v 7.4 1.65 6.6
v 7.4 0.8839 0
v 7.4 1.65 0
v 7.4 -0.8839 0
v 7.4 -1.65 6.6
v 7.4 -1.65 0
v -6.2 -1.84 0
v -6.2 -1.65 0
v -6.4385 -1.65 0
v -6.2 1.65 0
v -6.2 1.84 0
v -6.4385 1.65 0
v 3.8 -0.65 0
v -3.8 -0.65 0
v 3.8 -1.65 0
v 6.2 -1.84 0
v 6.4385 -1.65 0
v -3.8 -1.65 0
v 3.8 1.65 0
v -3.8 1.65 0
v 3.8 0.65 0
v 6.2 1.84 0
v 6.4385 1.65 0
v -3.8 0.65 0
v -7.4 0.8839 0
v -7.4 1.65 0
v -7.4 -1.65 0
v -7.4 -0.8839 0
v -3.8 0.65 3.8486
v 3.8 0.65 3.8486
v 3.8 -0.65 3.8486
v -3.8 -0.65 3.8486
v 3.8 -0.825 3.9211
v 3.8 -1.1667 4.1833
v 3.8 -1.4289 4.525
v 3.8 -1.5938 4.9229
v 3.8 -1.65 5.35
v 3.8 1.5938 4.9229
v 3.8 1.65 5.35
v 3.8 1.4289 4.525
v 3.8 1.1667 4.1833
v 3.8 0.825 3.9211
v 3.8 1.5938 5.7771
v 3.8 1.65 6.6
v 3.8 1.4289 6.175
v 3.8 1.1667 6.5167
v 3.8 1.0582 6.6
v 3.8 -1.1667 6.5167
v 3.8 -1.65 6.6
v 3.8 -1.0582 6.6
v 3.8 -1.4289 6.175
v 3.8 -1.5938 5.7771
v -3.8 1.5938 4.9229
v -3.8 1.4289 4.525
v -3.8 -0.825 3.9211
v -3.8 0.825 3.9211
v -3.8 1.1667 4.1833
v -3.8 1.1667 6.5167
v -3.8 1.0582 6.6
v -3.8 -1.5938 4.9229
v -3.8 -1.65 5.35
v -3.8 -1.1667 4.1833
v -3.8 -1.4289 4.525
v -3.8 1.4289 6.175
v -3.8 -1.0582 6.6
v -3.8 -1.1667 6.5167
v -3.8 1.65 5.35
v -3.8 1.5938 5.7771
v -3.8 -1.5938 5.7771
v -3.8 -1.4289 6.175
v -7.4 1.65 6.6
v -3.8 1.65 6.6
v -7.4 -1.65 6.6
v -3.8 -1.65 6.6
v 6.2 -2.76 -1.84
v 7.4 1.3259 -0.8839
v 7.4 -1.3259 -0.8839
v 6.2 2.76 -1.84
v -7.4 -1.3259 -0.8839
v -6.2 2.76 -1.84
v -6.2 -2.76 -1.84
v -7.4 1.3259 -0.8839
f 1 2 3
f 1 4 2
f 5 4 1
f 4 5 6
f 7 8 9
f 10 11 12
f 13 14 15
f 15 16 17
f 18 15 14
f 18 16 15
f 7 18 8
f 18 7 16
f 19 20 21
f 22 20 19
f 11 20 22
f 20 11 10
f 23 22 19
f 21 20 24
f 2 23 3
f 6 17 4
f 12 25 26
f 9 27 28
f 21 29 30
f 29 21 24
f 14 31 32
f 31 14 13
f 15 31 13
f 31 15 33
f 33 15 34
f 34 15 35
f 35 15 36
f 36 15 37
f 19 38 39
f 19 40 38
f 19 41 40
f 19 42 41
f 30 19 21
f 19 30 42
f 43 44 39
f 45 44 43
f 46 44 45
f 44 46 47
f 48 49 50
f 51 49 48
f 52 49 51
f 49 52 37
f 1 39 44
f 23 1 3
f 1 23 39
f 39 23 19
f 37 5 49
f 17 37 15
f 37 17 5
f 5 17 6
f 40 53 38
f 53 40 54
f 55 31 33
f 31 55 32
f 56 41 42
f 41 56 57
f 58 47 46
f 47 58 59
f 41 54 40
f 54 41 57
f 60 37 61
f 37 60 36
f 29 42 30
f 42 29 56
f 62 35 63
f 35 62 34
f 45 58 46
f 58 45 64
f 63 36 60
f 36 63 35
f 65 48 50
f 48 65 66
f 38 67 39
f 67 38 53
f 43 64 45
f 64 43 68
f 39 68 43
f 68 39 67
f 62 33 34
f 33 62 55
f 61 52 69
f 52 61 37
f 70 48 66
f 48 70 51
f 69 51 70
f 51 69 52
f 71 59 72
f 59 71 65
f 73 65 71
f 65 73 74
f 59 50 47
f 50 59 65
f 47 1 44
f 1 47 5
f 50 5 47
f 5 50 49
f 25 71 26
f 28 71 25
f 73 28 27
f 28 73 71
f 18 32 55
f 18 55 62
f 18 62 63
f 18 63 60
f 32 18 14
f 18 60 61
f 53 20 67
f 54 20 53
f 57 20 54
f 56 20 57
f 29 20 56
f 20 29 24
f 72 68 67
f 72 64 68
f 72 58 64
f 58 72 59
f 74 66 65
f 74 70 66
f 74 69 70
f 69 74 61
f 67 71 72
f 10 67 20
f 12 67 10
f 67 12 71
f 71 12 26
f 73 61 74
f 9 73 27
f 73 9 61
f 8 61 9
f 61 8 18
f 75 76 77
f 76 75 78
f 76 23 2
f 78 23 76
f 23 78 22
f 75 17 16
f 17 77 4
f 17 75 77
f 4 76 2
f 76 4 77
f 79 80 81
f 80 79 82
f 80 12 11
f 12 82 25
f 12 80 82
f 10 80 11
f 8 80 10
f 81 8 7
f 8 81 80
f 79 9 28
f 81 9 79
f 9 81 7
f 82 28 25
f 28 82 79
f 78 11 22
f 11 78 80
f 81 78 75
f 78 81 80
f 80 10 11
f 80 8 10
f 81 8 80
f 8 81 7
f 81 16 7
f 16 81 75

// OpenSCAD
// file: am_dovetail.scad
// am_dovetail.scad
// a library providing dovetail interconnections
//
//
// Background:
//   - CAD manual: http://www.openscad.org/documentation.html
//   - possibility to attach to parts from raspi_RJ45fix.scad
//
// Andreas Merz 2020-01-04, v0.2 
// GPLv3 or later, see http://www.gnu.org/licenses





//-------------------------------
// dovetail
//
//       w2
//    ---------
//    \       /  h
//     ---+---
//       w1
//-------------------------------

// Main dimensions
dt_w1=4;              // nominal size
dt_w2=6;
dt_h=2; 
dt_grid=dt_w1+dt_w2;  // 10 mm
dt_c=0.16;            // clearance / spiel in mm

dt_angle_deg=atan((dt_w2-dt_w1)/dt_w1);

// -------------------------------------------------------
// 2D shapes
// -------------------------------------------------------

module dt_shapeNominal(h=dt_h, w1=dt_w1, w2=dt_w2, c=0) {
             hh=h-c;
	     y1=w1/2-c;
	     y2=y1+(w2-w1)/2*hh/h;   // keep slope angle, even if c is not 0;
             polygon(points=[[-y1,0],[y1,0],[y2,hh],[-y2,hh]]);
}

module dt_shapeMajor() {
  dt_shapeNominal(c=-dt_c);
}

module dt_shapeMinor() {
  dt_shapeNominal(c=dt_c);
}


// -------------------------------------------------------
// 3D shapes
// -------------------------------------------------------

// legacy module

module dovetail3D(h=20, s=45, t=0.8) {
         c=0.3;   // clearance / spiel in mm
         difference() { 
           linear_extrude(height=h)
              union() {
                dt_shapeMinor();
                translate([-dt_h+c,-t]) square([dt_w1-2*c,t]);

              }
           rotate([s,0,0]) translate([-4,0,-4]) cube([8, 4, 4]);
         }
 }


// And cap - may be used to handle broadening at the printer bed

module am_dovetailCap(t=1.0, c=dt_c) {
      scl = (c < 0) ? 2 : 0;               // for negative clearances we create the dovetailSub case
      translate([0,0,0]) mirror([0,0,1])
      difference() {
	linear_extrude(height=dt_h/cos(30), scale=scl)
	  dt_shapeNominal(c=c);
	translate([-3*dt_w1,-3*dt_w2,t]) 
	  cube([6*dt_w1,6*dt_w2, dt_h/cos(30)+1]);
      }
}



// Dovetail to be attached to another body

module am_dovetailAdd(h=10, t=1.2, sgn=1) {
    //h:    overall height
    //t:    transition region
    //sub:  flag to handle the subtract case
    c = sgn*dt_c;
    union () {
      translate([0,0,t])
        am_dovetailCap(t=t, c=c);
      translate([0,0,t])
	linear_extrude(height=h-2*t, scale=1)
	  dt_shapeNominal(c=c);
      translate([0,0,h-t]) mirror([0,0,1])
        am_dovetailCap(t=t, c=c);
    }
}


// Dovetail to be carved out of another body

module am_dovetailSub(h=10, t=1.0) {
    //h:    overall height
    //t:    transition region
    //sub:  flag to handle the subtract case
    am_dovetailAdd(h=h, t=t, sgn=-1);
}


// negative dovetail to sculpt on another

module am_dovetailNeg(h=100, xo=dt_grid, yo=2*dt_h) {
    //h:    overall height
    //xo:   outer x
    //yo:   outer y
    difference() {
      translate([0, dt_h+0.01, h/2]) cube([xo, yo, h-0.02], center=true);
      linear_extrude(height=h, scale=1)	dt_shapeNominal(c=dt_c);
    }
}


// Multiple dovetails

module am_dovetailAddN(h=10, t=1.0, n=6, sgn=1) {
  m=n/2+0.5;
  for (i=[1:n]) {
    translate([dt_grid*(i-m),0,0]) am_dovetailAdd(h=h, t=t, sgn=sgn); 
  }
}

module am_dovetailPlateA(h=10, n=6, d=3) {
  y=(d-dt_c)/2;
  dw=(dt_w2-dt_w1)/2;
  union() {
    translate([0, y, 0])  am_dovetailAddN(h=h,n=n);
    translate([0,0,h/2]) cube([(n-0.5)*dt_grid-dw-dt_c, 2*y, h], center=true);
    translate([0,-y, 0])  mirror([0,1,0]) am_dovetailAddN(h=h,n=(n-1));
  }
}

module am_dovetailPlateB(h=10, n=6, d=3) {
  y=(d-dt_c)/2;
  dw=(dt_w2-dt_w1)/2;
  difference() {
    union() {
      translate([0,y,0]) am_dovetailAddN(h=h,n=n);
      translate([0,0,h/2]) cube([(n-0.5)*dt_grid+dw-dt_c, 2*y, h], center=true);
      translate([0,-y,0]) mirror([0,1,0]) am_dovetailAddN(h=h,n=(n-1));
    }
    union() {
      translate([-(n-1)*dt_grid/2-dw, d/2+dt_h+dt_c-dt_w2/2, -0.1]) rotate([0, 0, 90]) am_dovetailNeg(h=h+0.2);
      translate([+(n-1)*dt_grid/2+dw, d/2+dt_h+dt_c-dt_w2/2, -0.1]) rotate([0, 0,-90]) am_dovetailNeg(h=h+0.2);
    }
  }
}

//------------- Instances --------------------

// module testing

// test 2D shapes
//translate([dt_grid/2+0.2, dt_h, 0]) mirror([0,1,0]) dt_shapeNominal(c=-dt_c);   dt_shapeNominal(c=dt_c);
//translate([0, 0, 1.1]) mirror([0,0,0]) dt_shapeNominal(c=-dt_c);  color("red") dt_shapeNominal(c=dt_c);

// test 3D shapes
//mirror([0,0,1]) am_dovetailCap(c=+0.01);  translate([0,0,0])  am_dovetailCap(c=-0.01);
//am_dovetailAdd(h=5,t=0.1);  translate([dt_grid/2+0.2, dt_h+dt_c, 0]) mirror([0,1,0]) am_dovetailSub(h=5,t=0.1);

//dovetail3D();

//am_dovetailAdd();

//am_dovetailAddN();

//am_dovetailPlateA();

//am_dovetailNeg(h=10);


am_dovetailPlateB(n=4);
// main file
// Adapters for various purposes
// 
// 
// Background:
//   - Adapter for Head Magnifying glasses
//     Rightwell Eyeglasses No.9892B2 from choiko@outlook.com
//     to combine two lenses
//   - repository: https://github.com/Github6am/am_parts3D
//   - CAD manual: http://www.openscad.org/documentation.html
//
//
// Andreas Merz 2023-01-19, v0.1 
// GPLv3 or later, see http://www.gnu.org/licenses

// import dovetail and mounting plate definitions
use <am_dovetail.scad>


// Main dimensions
xos=15;        // snapper width of dual lens
yos=3.5;       // snapper thickness
zos=7;         // snapper height
dxs=3.6;       // snapper rim width
dys=1;         // snapper carve depth
wall=1.5;      // wall thickness of printed part
clr=0.2;       // clearance


//-------------------------------------------------------------------------
// Lens snap mount
//-------------------------------------------------------------------------

// basic shape

module lens_basicA(x=xos, y=yos, z=zos) {
    x1=(x-2*dxs);  // center region width
    y1=(y-2*dys);  // center thickness
    difference() {
      union() {
              translate([0,   -y1/2, 0])     cube( [x/2, y1,  z], center=false);
              translate([x1/2, -y/2, 0])     cube( [dxs, y,   z], center=false);
              //translate([0,    -y/2, z-y/2]) cube( [x/2, y, y/2], center=false);
              translate([0,       0, z-y/2]) 
                rotate([0, 90, 0]) 
                  cylinder(d=y, h=x/2, center=false, $fn=24);
      }
      // cut 0.4mm from top
      translate([-0.5,    -y, z-0.4]) cube( [x, 2*y, y/2], center=false);
    }
}

// symmetric shape with possible clearance

module lens_basicB(x=xos, y=yos, z=zos, c=0) {
    union() {
      mirror([0,0,0]) lens_basicA(x=x+c, y=y+c, z=z);
      mirror([1,0,0]) lens_basicA(x=x+c, y=y+c, z=z);
    }
}


module lens_dovetail() {
    c=-clr;
    union() {
      translate([0, 0, 0]) lens_basicB( c=c);
      translate([(xos+c)/2, 0, 0]) rotate([0, -90, 0]) rotate([0, 0, 90])
        am_dovetailAdd(h=xos+c);
    }
}     

//------------- Instances --------------------

//lens_basicB();

lens_dovetail();
